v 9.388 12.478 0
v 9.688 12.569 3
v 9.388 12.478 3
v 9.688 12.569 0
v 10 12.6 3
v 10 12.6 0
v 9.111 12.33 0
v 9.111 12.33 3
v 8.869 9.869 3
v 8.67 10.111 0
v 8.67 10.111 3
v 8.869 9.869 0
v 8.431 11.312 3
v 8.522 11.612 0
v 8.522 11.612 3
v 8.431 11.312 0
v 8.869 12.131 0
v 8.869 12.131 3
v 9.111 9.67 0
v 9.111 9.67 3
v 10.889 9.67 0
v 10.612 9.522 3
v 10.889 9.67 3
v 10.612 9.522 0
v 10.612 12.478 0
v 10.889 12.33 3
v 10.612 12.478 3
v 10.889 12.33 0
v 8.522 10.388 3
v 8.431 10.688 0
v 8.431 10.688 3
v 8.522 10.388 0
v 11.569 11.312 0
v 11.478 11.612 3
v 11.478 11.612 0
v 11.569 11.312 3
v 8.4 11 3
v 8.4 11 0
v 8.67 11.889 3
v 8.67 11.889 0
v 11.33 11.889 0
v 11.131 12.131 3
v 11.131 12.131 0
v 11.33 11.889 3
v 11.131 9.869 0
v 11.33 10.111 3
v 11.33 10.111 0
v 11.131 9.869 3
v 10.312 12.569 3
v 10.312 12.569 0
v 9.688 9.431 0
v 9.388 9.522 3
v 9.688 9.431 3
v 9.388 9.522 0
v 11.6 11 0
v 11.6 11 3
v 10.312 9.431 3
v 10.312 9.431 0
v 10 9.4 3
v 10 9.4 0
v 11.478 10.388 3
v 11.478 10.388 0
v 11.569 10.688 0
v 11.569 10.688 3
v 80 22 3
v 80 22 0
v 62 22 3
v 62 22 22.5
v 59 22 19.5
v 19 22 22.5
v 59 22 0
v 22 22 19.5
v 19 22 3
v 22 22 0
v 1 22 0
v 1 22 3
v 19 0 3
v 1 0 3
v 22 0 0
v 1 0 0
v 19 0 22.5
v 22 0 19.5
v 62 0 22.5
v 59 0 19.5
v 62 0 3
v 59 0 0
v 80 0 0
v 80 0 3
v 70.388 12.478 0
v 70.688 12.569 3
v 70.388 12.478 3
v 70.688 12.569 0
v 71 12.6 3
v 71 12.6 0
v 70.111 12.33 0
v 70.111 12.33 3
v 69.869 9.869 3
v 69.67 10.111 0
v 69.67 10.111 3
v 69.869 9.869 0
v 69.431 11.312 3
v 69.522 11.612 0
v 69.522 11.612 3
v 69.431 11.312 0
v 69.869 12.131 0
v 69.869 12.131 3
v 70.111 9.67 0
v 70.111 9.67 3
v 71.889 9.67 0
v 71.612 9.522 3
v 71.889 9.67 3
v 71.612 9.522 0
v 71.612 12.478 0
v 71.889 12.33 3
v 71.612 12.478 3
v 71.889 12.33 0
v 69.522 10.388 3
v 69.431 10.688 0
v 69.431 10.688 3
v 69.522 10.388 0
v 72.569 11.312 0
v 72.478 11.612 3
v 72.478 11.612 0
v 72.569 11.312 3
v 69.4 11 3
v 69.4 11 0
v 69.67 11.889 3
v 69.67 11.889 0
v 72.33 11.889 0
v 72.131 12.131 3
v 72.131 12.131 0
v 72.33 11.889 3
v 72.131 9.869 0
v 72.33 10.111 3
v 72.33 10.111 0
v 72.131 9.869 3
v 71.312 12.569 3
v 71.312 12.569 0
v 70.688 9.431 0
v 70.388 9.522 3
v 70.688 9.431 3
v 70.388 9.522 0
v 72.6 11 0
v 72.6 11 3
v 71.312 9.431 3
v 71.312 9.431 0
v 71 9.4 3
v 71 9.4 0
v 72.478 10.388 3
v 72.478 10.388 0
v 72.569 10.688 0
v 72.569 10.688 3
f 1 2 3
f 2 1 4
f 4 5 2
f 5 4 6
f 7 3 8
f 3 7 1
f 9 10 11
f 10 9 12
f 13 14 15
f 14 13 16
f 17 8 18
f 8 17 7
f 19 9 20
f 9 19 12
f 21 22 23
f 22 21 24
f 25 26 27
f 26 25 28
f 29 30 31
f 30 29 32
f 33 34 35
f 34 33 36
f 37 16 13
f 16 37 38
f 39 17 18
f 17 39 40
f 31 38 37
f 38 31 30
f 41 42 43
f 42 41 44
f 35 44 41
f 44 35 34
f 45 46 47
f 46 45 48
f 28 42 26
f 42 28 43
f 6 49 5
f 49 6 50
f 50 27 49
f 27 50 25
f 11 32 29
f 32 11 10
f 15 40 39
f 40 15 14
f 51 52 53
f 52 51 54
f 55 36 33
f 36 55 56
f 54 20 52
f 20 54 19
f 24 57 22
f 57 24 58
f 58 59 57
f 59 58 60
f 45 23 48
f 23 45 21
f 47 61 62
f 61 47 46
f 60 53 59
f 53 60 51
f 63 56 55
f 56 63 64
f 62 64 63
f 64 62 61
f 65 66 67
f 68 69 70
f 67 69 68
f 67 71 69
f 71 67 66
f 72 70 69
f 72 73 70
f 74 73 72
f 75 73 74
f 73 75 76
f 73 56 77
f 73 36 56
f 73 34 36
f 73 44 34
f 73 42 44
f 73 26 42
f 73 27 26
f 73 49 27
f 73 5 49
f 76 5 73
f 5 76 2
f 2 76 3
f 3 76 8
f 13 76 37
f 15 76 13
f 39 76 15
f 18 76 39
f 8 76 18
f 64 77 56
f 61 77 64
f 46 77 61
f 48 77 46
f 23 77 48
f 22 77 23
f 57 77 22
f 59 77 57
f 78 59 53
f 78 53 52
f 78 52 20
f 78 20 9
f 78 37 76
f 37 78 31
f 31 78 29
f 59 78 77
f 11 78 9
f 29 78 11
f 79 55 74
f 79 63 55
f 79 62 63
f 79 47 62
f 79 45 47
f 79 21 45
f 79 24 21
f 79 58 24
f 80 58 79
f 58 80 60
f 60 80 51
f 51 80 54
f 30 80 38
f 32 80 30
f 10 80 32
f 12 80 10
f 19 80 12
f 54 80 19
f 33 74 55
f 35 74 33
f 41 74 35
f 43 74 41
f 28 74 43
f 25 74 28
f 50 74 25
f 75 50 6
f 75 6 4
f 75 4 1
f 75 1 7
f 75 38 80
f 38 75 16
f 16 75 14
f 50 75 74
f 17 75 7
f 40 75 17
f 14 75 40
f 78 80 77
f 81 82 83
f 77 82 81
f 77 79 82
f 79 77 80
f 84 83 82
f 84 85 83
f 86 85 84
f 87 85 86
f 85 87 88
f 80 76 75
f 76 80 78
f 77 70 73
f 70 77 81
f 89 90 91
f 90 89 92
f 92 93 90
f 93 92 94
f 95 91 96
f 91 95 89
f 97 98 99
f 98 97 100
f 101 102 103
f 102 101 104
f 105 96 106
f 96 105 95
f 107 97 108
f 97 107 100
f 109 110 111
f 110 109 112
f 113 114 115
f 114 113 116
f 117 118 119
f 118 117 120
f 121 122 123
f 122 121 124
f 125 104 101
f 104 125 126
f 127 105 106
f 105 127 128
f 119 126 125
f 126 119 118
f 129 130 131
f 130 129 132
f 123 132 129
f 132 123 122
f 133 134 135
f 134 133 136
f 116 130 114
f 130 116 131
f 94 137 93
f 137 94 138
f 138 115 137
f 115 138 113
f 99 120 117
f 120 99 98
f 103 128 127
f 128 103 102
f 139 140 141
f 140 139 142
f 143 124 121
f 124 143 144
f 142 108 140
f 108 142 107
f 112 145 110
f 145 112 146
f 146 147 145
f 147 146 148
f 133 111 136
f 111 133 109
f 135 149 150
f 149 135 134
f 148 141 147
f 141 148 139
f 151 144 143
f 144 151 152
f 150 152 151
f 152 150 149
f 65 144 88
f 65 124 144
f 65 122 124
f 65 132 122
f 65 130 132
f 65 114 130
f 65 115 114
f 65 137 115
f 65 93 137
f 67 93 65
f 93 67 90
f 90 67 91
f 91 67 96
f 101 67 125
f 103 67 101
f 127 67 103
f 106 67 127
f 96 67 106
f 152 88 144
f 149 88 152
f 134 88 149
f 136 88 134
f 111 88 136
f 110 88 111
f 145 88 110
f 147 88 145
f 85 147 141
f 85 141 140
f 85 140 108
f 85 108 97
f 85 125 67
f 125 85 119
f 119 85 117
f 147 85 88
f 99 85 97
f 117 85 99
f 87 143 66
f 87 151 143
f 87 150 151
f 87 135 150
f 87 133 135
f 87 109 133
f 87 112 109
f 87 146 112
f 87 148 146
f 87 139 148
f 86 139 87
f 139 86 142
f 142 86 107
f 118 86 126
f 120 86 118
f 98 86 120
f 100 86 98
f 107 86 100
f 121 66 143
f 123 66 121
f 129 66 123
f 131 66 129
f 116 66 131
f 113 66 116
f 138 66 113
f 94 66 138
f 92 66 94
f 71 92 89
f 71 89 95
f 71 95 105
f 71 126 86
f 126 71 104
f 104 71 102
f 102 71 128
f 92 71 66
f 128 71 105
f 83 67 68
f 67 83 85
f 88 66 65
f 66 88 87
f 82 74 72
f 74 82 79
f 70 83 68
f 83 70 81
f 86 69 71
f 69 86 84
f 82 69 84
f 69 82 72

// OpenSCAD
$fn=32;

m3_diameter = 3.2;
m3_head_diameter = 5.5;
m3_head_height = 2.5;
m3_hole_depth = 5.5;

module m3_screw_hole() {
    translate([0, 0, -m3_head_height])
    cylinder(h = m3_head_height, d1 = m3_diameter, d2 = m3_diameter);
    cylinder(h = m3_hole_depth, d = m3_diameter);
}


union(){
    // cube 1 with hole
    rotate([0, 0, 90]) {
        translate([0, -19, 0]) {
            color("red") {
                difference() {
                    cube([22, 18, 3]);
                    translate([11, 9, -1]) {
                        m3_screw_hole();
                    }
                }
            }
        }
        
        // cube 2 with hole
    translate([0, -80, 0]){
        color("red") {
            difference() {
                cube([22, 18, 3]);
                translate([11, 9, -1]) {
                    m3_screw_hole();
                }
            }
        }
    }
    }


    // cube 3 (yellow)
    rotate([0, 0, 90]) {
        translate([0, -19, 1]){
            rotate([90, 0, 0]) {
                translate([0, -1, 0]) {
                    cube([22, 22.5, 3]);
                }
            }
        }
    }

    // cube 4 (yellow)
    rotate([0, 0, 90]) {
        translate([0, -59, 1]){
            rotate([90, 0, 0]) {
                translate([0, -1, 0]) {
                    cube([22, 22.5, 3]);
                }
            }
        }
    }

    // cube 5 (blue)
    rotate([0, 0, 90]) {
        translate([0, -59, 19.5]){
            color("blue"){
                cube([22, 37, 3]);
            }
        }
    }
}


/*
// battery (green)
translate([22, -22, 0]){
    color("green"){
        cube([37, 68, 19]);
    }
}
*/
